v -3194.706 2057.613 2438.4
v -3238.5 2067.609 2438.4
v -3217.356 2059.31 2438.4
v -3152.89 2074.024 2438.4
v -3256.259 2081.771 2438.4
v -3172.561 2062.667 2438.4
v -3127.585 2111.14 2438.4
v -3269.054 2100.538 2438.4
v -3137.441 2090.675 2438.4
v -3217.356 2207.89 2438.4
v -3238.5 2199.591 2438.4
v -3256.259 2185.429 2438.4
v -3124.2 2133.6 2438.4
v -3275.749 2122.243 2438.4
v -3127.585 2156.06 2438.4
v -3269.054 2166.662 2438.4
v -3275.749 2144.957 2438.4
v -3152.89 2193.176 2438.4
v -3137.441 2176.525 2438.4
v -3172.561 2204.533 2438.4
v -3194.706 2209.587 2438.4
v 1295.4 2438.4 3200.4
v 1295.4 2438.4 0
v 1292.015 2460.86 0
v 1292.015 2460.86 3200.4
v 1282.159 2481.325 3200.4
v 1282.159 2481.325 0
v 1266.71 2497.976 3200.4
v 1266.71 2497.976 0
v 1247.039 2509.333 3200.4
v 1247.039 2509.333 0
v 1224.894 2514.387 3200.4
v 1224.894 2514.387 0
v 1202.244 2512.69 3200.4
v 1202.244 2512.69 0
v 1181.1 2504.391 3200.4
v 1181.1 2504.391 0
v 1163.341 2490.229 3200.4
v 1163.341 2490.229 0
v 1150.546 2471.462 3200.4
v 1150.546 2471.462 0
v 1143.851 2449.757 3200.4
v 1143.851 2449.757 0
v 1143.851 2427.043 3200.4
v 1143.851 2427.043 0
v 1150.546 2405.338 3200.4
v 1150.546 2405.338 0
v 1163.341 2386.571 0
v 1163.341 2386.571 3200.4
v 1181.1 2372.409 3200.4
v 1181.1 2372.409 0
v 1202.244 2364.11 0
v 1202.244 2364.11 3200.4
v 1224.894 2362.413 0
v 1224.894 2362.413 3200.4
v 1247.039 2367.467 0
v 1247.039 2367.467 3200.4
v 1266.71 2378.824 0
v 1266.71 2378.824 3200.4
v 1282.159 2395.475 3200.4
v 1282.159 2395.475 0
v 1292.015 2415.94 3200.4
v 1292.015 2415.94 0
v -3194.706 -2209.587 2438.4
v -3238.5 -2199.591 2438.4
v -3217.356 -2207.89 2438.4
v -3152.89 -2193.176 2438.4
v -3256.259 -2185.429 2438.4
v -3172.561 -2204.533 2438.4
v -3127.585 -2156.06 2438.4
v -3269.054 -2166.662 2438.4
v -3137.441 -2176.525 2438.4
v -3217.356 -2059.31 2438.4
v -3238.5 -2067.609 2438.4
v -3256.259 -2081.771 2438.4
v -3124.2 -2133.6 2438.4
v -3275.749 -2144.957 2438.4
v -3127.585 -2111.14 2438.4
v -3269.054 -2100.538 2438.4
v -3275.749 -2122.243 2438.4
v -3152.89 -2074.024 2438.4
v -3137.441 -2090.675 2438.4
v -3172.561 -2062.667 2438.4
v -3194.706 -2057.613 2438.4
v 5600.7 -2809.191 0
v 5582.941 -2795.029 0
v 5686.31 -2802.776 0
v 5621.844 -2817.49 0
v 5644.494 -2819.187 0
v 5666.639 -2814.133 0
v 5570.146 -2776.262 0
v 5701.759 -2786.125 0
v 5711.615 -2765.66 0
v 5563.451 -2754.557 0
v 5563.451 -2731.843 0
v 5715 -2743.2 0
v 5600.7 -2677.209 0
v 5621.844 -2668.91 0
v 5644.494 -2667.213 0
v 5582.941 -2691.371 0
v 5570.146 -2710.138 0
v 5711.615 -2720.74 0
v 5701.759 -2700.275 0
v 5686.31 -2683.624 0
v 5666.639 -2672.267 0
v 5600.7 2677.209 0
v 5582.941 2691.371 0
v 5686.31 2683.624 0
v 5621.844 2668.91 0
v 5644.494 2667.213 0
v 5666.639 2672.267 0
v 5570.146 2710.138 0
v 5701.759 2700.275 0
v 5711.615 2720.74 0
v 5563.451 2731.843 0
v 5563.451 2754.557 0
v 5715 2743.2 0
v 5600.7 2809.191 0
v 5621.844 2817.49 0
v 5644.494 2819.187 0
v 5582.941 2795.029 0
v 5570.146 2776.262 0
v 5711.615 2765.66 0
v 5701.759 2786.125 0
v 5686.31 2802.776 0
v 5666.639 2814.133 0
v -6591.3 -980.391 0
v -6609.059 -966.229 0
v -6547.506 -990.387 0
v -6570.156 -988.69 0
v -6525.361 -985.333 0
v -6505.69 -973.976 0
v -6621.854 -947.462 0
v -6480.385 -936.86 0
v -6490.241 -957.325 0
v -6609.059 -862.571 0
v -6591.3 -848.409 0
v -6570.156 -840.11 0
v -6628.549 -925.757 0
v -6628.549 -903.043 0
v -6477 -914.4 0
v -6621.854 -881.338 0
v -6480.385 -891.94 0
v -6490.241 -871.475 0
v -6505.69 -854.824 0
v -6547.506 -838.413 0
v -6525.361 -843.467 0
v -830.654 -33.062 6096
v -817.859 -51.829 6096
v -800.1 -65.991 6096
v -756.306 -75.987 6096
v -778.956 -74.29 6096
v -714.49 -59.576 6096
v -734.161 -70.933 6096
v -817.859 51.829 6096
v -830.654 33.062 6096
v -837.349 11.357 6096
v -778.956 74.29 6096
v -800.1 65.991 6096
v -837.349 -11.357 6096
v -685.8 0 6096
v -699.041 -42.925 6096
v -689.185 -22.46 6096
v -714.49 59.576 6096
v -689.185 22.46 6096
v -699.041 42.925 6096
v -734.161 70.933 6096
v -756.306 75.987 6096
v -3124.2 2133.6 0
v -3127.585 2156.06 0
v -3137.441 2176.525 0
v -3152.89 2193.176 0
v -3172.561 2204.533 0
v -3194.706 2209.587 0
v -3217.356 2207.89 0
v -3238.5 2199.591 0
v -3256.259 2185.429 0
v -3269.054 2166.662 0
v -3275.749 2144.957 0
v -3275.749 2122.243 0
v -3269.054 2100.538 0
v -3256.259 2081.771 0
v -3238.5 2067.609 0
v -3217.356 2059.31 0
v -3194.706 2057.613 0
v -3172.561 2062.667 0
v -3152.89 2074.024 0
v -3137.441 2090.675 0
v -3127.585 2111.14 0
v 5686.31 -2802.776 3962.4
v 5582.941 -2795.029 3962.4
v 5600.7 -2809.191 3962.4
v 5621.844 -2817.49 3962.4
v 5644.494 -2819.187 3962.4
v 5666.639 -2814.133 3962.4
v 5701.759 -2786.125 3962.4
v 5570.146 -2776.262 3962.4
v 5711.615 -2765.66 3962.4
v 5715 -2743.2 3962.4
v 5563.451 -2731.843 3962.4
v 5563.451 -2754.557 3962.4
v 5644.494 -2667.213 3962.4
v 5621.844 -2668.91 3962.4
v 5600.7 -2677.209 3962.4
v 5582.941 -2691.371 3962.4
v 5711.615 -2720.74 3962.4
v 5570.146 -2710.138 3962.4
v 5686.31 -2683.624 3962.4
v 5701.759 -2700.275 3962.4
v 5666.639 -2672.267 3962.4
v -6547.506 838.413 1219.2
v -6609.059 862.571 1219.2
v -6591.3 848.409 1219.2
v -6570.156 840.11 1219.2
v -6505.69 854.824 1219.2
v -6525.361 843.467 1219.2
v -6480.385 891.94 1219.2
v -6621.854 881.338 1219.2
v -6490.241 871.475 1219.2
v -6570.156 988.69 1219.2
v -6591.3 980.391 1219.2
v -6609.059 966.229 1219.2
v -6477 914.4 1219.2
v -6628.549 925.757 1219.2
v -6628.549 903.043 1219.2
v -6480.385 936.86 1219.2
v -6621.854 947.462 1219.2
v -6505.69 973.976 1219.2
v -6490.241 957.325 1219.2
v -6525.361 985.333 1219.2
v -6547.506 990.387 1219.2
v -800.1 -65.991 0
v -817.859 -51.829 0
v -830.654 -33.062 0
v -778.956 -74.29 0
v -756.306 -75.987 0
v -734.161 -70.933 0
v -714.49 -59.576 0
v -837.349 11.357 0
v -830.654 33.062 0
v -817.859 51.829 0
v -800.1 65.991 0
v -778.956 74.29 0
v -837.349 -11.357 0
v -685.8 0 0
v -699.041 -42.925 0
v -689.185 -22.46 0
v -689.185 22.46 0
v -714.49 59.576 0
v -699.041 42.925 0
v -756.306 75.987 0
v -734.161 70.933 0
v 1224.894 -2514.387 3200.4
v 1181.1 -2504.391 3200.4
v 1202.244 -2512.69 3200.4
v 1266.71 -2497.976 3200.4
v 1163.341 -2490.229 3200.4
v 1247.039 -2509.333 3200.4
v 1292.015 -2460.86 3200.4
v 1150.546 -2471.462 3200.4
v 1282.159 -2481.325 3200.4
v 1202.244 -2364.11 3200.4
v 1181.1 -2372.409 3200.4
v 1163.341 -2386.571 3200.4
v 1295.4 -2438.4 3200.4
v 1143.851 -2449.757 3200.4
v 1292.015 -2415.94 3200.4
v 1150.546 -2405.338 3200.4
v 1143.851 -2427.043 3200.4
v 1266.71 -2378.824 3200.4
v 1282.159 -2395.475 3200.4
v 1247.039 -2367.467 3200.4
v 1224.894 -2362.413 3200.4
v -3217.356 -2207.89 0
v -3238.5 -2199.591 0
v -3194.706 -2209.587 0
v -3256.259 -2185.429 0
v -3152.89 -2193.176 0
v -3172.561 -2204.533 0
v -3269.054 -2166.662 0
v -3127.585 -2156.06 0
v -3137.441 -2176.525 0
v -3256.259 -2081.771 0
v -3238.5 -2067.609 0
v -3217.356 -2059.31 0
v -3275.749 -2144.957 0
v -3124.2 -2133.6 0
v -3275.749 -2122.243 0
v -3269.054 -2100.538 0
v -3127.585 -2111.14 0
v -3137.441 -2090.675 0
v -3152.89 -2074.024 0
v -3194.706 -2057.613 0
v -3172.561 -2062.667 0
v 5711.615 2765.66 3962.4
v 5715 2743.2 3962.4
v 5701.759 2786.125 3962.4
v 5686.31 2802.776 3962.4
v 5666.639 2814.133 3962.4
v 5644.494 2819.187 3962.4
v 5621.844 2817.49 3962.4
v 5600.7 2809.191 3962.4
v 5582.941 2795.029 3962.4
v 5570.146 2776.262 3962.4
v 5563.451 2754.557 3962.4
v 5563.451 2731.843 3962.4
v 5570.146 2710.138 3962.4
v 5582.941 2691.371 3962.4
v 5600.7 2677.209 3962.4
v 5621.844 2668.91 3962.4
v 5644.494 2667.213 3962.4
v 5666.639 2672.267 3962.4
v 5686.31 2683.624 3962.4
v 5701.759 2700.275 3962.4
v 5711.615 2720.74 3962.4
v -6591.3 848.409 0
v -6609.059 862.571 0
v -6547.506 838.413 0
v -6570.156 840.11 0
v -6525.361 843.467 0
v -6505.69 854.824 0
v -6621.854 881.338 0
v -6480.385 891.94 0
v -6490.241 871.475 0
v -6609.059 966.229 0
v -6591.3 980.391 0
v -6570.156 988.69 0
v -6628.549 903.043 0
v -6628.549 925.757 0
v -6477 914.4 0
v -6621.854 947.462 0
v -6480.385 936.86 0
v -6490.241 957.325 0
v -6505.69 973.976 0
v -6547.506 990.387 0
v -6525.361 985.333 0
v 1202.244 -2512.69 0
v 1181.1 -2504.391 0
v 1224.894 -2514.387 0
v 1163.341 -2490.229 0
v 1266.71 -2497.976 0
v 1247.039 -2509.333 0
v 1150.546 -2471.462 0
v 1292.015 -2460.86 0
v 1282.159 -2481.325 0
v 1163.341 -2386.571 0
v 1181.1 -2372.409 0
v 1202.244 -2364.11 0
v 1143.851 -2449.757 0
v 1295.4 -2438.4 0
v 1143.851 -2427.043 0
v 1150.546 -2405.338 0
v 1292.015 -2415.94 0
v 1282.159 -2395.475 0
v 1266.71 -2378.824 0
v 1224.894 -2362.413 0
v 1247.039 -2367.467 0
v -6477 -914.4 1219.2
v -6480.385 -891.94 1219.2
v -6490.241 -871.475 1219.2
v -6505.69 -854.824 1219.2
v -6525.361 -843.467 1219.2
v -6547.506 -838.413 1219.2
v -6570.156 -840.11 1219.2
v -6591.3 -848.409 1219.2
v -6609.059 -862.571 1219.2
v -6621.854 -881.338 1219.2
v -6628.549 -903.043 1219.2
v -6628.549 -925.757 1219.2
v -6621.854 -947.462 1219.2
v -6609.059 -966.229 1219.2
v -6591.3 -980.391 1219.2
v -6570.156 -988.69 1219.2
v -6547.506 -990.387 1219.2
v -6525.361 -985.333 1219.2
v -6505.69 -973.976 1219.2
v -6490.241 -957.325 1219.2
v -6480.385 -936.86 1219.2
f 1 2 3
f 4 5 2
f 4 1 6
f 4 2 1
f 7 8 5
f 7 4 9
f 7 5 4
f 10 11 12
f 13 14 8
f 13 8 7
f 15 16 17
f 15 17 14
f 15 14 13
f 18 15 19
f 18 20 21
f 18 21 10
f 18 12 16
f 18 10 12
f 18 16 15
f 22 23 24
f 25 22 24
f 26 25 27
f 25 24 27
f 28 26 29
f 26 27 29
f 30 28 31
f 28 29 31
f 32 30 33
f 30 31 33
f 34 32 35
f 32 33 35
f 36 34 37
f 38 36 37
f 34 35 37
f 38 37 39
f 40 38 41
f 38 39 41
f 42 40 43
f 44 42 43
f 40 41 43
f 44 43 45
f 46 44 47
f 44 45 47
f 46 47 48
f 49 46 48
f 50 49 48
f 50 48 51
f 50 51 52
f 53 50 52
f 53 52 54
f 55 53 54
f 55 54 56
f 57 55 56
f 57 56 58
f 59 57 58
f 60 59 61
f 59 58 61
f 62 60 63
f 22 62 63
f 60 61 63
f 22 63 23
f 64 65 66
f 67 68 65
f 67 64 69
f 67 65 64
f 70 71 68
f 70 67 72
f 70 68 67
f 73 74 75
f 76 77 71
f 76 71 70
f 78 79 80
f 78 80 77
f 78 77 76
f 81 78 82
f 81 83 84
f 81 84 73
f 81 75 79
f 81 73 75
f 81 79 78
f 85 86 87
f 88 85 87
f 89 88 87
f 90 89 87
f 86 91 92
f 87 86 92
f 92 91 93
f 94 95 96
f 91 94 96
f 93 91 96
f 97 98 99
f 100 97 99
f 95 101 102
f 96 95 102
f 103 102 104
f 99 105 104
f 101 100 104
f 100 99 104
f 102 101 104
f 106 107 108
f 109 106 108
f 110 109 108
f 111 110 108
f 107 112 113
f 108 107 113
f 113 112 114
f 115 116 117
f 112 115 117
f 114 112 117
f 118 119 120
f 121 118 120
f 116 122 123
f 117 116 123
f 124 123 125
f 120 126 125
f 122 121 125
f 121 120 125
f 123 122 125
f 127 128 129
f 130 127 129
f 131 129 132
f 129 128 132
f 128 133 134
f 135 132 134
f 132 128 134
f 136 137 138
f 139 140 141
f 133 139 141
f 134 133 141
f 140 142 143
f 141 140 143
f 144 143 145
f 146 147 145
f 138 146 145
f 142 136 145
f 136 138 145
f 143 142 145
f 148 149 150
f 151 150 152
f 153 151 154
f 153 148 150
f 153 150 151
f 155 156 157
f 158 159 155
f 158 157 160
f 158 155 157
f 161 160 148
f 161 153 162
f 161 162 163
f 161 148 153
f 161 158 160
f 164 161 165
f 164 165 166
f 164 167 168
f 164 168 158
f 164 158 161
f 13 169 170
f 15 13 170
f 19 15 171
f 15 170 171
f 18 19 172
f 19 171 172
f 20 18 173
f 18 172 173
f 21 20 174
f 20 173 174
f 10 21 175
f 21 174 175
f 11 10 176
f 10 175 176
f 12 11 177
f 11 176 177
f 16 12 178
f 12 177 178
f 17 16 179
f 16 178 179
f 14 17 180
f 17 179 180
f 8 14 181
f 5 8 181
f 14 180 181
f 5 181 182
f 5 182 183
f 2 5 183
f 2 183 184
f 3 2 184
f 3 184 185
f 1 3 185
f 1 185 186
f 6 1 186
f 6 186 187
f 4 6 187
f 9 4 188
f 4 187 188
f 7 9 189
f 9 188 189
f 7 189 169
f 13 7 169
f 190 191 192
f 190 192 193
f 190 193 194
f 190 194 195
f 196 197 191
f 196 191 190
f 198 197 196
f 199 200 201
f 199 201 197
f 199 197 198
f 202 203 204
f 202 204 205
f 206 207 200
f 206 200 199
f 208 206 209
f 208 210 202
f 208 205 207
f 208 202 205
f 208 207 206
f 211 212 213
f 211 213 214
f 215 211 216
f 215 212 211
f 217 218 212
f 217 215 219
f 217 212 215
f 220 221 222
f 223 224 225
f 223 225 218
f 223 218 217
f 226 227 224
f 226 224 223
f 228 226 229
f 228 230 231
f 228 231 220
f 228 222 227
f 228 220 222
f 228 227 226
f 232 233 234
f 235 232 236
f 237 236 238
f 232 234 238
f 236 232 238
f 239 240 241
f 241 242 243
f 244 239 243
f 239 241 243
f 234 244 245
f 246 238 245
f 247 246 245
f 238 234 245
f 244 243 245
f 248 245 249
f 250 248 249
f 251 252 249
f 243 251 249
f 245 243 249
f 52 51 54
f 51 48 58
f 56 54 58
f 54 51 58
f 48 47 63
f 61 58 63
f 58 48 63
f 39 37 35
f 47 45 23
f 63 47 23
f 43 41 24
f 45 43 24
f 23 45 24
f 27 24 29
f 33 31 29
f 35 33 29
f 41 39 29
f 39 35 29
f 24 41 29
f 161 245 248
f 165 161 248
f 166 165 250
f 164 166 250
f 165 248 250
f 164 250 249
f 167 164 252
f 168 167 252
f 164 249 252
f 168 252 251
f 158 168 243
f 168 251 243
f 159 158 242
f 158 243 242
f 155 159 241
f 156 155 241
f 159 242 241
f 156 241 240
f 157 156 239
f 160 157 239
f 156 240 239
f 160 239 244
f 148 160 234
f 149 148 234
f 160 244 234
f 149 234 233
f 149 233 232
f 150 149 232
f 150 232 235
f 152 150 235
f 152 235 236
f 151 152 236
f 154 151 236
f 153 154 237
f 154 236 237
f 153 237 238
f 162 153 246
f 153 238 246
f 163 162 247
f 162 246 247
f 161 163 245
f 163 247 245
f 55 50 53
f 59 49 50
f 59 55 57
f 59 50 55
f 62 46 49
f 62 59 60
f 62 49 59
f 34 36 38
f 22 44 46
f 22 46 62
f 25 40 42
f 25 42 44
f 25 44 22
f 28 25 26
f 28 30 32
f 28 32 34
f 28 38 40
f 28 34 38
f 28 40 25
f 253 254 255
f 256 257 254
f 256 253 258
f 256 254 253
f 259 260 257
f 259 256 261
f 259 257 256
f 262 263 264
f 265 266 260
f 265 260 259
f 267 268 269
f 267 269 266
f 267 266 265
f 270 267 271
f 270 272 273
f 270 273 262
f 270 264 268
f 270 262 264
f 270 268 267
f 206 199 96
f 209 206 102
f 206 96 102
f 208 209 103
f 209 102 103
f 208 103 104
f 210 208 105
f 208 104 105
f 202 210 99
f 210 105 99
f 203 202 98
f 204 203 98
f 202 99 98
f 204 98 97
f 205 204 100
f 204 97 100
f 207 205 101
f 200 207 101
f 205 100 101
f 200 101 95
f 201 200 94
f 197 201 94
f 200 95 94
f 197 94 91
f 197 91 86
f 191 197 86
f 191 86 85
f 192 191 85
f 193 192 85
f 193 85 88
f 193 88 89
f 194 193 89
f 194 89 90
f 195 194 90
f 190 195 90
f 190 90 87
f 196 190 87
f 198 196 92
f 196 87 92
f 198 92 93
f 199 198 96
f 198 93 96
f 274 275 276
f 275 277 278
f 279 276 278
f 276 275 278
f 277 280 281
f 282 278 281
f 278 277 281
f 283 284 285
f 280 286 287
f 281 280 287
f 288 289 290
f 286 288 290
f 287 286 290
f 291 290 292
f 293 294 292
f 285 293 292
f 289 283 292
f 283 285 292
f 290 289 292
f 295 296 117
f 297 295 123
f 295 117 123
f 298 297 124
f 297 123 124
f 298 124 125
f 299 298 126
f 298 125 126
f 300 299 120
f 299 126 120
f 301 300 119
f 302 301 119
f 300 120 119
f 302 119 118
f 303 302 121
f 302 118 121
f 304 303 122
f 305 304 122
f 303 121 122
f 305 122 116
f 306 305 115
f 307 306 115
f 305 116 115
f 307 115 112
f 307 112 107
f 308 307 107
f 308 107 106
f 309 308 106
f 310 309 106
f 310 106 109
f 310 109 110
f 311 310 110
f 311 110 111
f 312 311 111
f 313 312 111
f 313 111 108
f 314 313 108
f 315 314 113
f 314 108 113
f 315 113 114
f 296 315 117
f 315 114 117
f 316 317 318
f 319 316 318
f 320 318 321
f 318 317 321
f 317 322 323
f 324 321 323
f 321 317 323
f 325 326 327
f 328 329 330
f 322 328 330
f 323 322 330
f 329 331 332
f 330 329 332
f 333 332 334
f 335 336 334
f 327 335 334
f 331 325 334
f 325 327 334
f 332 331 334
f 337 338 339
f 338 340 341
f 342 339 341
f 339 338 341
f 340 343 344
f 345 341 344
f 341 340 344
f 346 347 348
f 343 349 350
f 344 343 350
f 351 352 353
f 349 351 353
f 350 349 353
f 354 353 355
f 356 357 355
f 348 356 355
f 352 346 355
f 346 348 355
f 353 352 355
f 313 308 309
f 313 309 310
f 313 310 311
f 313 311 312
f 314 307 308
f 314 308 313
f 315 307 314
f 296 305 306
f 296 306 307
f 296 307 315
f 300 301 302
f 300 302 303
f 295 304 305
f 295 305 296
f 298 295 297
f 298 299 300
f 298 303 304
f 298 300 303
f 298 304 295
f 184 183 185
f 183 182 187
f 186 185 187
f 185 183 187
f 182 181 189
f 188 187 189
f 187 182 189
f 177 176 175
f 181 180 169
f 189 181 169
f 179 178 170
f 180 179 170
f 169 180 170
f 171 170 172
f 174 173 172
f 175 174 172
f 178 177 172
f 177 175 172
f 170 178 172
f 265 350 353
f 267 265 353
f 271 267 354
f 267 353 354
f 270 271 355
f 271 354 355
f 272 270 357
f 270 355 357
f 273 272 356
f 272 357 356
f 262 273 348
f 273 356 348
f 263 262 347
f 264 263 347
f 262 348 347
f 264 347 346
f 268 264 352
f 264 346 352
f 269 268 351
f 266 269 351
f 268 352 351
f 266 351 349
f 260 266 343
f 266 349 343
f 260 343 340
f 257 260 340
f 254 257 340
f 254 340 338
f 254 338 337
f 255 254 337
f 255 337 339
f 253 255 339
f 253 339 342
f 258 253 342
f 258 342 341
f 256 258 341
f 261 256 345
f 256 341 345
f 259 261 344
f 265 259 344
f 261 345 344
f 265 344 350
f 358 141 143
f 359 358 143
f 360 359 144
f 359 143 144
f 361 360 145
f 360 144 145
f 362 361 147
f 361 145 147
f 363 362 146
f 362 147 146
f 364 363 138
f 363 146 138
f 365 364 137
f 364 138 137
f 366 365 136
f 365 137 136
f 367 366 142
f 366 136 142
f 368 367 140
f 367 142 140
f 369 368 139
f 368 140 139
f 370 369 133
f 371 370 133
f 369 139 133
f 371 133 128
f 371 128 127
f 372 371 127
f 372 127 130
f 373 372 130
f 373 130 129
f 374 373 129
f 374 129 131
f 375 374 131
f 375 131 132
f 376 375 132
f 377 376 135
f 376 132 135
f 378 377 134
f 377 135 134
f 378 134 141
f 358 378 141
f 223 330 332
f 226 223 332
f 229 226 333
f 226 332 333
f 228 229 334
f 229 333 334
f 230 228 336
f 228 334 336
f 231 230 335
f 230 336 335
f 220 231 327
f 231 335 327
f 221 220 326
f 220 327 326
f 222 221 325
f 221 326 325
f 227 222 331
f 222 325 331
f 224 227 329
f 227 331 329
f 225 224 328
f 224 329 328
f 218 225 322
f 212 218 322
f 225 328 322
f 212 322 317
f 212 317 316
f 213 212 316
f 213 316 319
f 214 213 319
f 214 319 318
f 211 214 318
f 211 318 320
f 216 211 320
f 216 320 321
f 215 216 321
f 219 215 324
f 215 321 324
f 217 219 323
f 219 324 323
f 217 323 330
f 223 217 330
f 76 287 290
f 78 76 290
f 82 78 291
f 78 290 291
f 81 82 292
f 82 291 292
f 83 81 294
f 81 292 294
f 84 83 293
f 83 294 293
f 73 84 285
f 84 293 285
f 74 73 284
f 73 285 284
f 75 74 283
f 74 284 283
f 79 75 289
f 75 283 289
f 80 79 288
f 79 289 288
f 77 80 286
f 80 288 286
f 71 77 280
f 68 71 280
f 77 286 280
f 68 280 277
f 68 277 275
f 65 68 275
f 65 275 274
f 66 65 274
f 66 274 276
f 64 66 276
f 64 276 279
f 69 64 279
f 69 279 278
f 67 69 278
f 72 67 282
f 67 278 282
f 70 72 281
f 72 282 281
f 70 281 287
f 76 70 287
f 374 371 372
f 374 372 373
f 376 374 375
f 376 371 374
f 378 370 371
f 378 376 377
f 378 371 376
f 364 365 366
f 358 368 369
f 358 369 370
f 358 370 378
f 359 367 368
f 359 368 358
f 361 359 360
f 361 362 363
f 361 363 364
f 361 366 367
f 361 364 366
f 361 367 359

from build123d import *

# Parameters (mm, degrees)
F1_R     = 76.2
F2_DEPTH = 1219.2
F3_DEPTH = 2438.4
F4_DEPTH = 6096
F5_DEPTH = 3200.4
F6_DEPTH = 3962.4


# Not quite as in the source:
# - the program builds the solid bodies; features that only make, move or delete a surface that nothing else refers to are left out


with BuildPart() as f2:
    # F1 (on Top) → F2 (new body)
    with BuildSketch(Plane.XY):
        with Locations((-6553.2, 914.4)):
            Circle(F1_R)
    extrude(amount=F2_DEPTH)


with BuildPart() as f2b:
    # F1 (on Top) → F2, piece 2 (new body)
    with BuildSketch(Plane.XY):
        with Locations((-6553.2, -914.4)):
            Circle(F1_R)
    extrude(amount=F2_DEPTH)


with BuildPart() as f3:
    # F1 (on Top) → F3 (new body)
    with BuildSketch(Plane.XY):
        with Locations((-3200.4, 2133.6)):
            Circle(F1_R)
    extrude(amount=F3_DEPTH)


with BuildPart() as f3b:
    # F1 (on Top) → F3, piece 2 (new body)
    with BuildSketch(Plane.XY):
        with Locations((-3200.4, -2133.6)):
            Circle(F1_R)
    extrude(amount=F3_DEPTH)


with BuildPart() as f4:
    # F1 (on Top) → F4 (new body)
    with BuildSketch(Plane.XY):
        with Locations((-762, 0)):
            Circle(F1_R)
    extrude(amount=F4_DEPTH)


with BuildPart() as f5:
    # F1 (on Top) → F5 (new body)
    with BuildSketch(Plane.XY):
        with Locations((1219.2, 2438.4)):
            Circle(F1_R)
    extrude(amount=F5_DEPTH)


with BuildPart() as f5b:
    # F1 (on Top) → F5, piece 2 (new body)
    with BuildSketch(Plane.XY):
        with Locations((1219.2, -2438.4)):
            Circle(F1_R)
    extrude(amount=F5_DEPTH)


with BuildPart() as f6:
    # F1 (on Top) → F6 (new body)
    with BuildSketch(Plane.XY):
        with Locations((5638.8, 2743.2)):
            Circle(F1_R)
    extrude(amount=F6_DEPTH)


with BuildPart() as f6b:
    # F1 (on Top) → F6, piece 2 (new body)
    with BuildSketch(Plane.XY):
        with Locations((5638.8, -2743.2)):
            Circle(F1_R)
    extrude(amount=F6_DEPTH)


solid = Compound([f2.part, f2b.part, f3.part, f3b.part, f4.part, f5.part, f5b.part, f6.part, f6b.part])
